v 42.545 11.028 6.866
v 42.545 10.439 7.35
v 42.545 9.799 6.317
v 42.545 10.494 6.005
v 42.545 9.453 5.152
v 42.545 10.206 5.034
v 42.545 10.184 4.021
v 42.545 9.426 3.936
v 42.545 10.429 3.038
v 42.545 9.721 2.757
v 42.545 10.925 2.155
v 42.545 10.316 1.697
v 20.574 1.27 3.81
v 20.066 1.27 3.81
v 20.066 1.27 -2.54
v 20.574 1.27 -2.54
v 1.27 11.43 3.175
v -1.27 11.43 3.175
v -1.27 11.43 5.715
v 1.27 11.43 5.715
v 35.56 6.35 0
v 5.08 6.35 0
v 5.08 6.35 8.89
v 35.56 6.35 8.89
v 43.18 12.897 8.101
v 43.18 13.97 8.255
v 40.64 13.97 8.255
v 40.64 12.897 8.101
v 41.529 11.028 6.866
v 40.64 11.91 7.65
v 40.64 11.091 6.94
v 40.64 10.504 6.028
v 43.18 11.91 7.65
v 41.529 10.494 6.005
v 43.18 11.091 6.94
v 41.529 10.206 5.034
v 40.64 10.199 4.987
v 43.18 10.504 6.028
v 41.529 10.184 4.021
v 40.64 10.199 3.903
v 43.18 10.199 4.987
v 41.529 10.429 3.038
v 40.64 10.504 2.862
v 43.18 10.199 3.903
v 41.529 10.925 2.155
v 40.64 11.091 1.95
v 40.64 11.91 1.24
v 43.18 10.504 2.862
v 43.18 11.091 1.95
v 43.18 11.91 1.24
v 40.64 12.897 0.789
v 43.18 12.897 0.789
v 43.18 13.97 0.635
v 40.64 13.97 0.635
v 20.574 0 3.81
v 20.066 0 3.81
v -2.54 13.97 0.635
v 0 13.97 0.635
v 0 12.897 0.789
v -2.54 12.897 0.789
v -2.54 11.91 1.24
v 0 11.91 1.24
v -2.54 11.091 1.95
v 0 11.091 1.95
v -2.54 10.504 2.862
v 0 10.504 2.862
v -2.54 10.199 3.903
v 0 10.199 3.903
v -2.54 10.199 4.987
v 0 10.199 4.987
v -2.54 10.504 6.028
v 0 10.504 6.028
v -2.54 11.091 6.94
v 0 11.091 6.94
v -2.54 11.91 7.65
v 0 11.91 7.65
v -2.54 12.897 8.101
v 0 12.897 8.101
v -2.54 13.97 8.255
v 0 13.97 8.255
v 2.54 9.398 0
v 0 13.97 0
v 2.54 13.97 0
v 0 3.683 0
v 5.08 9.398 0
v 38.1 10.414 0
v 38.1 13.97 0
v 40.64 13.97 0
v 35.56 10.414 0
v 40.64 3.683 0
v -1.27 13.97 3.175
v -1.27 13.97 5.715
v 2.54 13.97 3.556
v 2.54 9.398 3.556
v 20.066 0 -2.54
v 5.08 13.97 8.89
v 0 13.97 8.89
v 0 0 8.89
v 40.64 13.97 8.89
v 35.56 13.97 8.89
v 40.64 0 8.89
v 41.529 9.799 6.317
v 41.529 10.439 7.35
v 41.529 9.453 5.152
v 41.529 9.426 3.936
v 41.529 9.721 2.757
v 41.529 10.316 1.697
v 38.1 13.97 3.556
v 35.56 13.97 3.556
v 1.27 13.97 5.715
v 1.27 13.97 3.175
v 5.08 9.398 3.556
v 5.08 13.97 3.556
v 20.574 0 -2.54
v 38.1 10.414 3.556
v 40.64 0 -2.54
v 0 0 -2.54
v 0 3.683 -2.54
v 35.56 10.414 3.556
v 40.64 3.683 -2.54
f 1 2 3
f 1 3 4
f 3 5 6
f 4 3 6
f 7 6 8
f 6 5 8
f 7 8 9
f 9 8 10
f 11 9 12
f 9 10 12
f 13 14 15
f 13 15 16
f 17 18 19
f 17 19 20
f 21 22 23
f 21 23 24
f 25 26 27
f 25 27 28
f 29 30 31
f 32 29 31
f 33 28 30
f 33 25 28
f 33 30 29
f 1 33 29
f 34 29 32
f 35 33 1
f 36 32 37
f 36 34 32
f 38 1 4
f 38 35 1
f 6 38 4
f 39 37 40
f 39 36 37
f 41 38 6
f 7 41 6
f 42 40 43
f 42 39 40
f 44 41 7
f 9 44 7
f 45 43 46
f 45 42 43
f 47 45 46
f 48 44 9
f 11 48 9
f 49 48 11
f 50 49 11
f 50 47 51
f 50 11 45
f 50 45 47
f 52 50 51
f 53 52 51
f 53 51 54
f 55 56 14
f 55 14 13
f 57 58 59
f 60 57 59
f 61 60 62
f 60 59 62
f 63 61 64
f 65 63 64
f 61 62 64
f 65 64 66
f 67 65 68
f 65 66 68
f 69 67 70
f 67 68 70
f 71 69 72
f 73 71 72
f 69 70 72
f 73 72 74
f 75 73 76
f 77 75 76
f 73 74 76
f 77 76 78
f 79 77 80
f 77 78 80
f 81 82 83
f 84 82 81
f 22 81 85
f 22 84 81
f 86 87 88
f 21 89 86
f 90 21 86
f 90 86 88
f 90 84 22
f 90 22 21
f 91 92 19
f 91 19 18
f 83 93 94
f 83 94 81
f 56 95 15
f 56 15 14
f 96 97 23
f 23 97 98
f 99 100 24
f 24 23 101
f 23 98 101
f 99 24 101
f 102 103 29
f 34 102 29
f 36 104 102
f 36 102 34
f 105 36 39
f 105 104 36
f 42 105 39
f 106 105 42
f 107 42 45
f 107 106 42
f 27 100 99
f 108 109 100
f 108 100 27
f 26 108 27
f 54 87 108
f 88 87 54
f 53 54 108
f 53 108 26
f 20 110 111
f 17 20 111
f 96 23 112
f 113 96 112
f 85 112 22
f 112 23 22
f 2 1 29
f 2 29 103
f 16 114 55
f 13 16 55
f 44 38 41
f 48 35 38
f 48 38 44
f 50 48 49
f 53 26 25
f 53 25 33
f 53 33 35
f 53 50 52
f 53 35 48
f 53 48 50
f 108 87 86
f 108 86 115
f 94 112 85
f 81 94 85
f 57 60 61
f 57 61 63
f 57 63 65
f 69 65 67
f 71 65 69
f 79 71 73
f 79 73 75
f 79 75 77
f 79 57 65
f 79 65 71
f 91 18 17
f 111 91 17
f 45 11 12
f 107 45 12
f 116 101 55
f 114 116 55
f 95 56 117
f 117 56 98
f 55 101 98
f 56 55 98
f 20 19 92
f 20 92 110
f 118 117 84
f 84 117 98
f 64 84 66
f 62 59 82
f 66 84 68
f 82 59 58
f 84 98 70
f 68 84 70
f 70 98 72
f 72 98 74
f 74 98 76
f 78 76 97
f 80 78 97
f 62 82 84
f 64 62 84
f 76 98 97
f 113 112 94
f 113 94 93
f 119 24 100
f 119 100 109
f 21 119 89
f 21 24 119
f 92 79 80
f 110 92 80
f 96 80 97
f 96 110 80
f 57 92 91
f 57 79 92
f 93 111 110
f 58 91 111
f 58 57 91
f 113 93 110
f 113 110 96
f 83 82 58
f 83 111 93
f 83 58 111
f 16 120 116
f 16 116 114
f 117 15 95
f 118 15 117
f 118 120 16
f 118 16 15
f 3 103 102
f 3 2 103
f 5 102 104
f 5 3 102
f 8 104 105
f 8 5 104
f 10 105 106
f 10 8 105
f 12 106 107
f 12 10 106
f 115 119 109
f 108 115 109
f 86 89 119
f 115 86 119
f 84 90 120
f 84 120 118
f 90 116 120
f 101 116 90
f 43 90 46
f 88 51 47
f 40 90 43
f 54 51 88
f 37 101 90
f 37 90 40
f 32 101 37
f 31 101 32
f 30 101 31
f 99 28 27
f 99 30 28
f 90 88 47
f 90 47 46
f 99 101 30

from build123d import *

# Parameters (mm, degrees)
SKETCH1_W           = 40.64
SKETCH1_H           = 6.35
BOSS_EXTRUDE1_DEPTH = 8.89
SKETCH2_W           = 5.08
SKETCH2_H           = 8.89
BOSS_EXTRUDE2_DEPTH = 7.62
SKETCH3_W           = 5.08
SKETCH3_H           = 8.89
BOSS_EXTRUDE3_DEPTH = 7.62
SKETCH4_W           = 3.556
SKETCH4_H           = 4.572
CUT_EXTRUDE1_DEPTH  = 2.54
BOSS_EXTRUDE4_DEPTH = 2.54
SKETCH6_W           = 40.64
SKETCH6_H           = 3.683
BOSS_EXTRUDE5_DEPTH = 2.54
SKETCH7_W           = 3.556
SKETCH7_H           = 3.556
CUT_EXTRUDE2_DEPTH  = 2.54
BOSS_EXTRUDE6_START = 2.54
BOSS_EXTRUDE6_DEPTH = 2.54
WRAP1_SECTION_W     = 0.762
WRAP1_SECTION_H     = 1.016
WRAP1_ANGLE         = 76.394372684
SKETCH11_W          = 0.508
SKETCH11_H          = 6.35
CUT_EXTRUDE3_DEPTH  = 1.27
SKETCH12_W          = 2.54
SKETCH12_H          = 2.54
CUT_EXTRUDE4_DEPTH  = 2.54


with BuildPart() as part:
    # Sketch1 → Boss-Extrude1 (new body)
    with BuildSketch(Plane.XY):
        with Locations((20.32, 3.175)):
            Rectangle(SKETCH1_W, SKETCH1_H)
    extrude(amount=BOSS_EXTRUDE1_DEPTH)

    # Sketch2 → Boss-Extrude2 (add)
    with BuildSketch(Plane(origin=(0, 6.35, 0), x_dir=(1, 0, 0), z_dir=(0, 1, 0))):
        with Locations((2.54, -4.445)):
            Rectangle(SKETCH2_W, SKETCH2_H)
    extrude(amount=BOSS_EXTRUDE2_DEPTH)

    # Sketch3 → Boss-Extrude3 (add)
    with BuildSketch(Plane(origin=(0, 6.35, 0), x_dir=(1, 0, 0), z_dir=(0, 1, 0))):
        with Locations((38.1, -4.445)):
            Rectangle(SKETCH3_W, SKETCH3_H)
    extrude(amount=BOSS_EXTRUDE3_DEPTH)

    # Sketch4 → Cut-Extrude1 (cut)
    with BuildSketch(Plane(origin=(5.08, 0, 0), x_dir=(0, 0, -1), z_dir=(1, 0, 0))):
        with Locations((-1.778, 11.684)):
            Rectangle(SKETCH4_W, SKETCH4_H)
    extrude(amount=-CUT_EXTRUDE1_DEPTH, mode=Mode.SUBTRACT)

    # Sketch5 → Boss-Extrude4 (add)
    with BuildSketch(Plane.ZY):
        with BuildLine():
            Line((8.255, 13.97), (0.635, 13.97))
            ThreePointArc((0.635, 13.97), (4.445, 10.16), (8.255, 13.97))
        make_face()
    extrude(amount=BOSS_EXTRUDE4_DEPTH)

    # Sketch6 → Boss-Extrude5 (add)
    with BuildSketch(Plane(origin=(0, 0, 0), x_dir=(-1, 0, 0), z_dir=(0, 0, -1))):
        with Locations((-20.32, 1.8415)):
            Rectangle(SKETCH6_W, SKETCH6_H)
    extrude(amount=BOSS_EXTRUDE5_DEPTH)

    # Sketch7 → Cut-Extrude2 (cut)
    with BuildSketch(Plane.ZY.offset(-35.56)):
        with Locations((1.778, 12.192)):
            Rectangle(SKETCH7_W, SKETCH7_H)
    extrude(amount=-CUT_EXTRUDE2_DEPTH, mode=Mode.SUBTRACT)

    # Sketch8 → Boss-Extrude6 (add)
    with BuildSketch(Plane(origin=(40.64, 0, 0), x_dir=(0, 0, -1), z_dir=(1, 0, 0)).offset(BOSS_EXTRUDE6_START)):
        with BuildLine():
            Line((-0.635, 13.97), (-8.255, 13.97))
            ThreePointArc((-8.255, 13.97), (-4.445, 10.16), (-0.635, 13.97))
        make_face()
    extrude(amount=-BOSS_EXTRUDE6_DEPTH)

    # Wrap1 section (on wrap section) → Wrap1 (revolve)
    with BuildSketch(Plane(origin=(43.18, 13.97, 4.445), x_dir=(0, -0.772203868534924, 0.6353748385163658), z_dir=(0, 0.6353748385163658, 0.772203868534924))):
        with Locations((4.191, -1.143)):
            Rectangle(WRAP1_SECTION_W, WRAP1_SECTION_H)
    revolve(axis=Axis((43.18, 13.97, 4.445), (1, 0, 0)), revolution_arc=WRAP1_ANGLE)

    # Sketch11 → Cut-Extrude3 (cut)
    with BuildSketch(Plane.XZ):
        with Locations((20.32, 0.635)):
            Rectangle(SKETCH11_W, SKETCH11_H)
    extrude(amount=-CUT_EXTRUDE3_DEPTH, mode=Mode.SUBTRACT)

    # Sketch12 → Cut-Extrude4 (cut)
    with BuildSketch(Plane(origin=(0, 13.97, 0), x_dir=(1, 0, 0), z_dir=(0, 1, 0))):
        with Locations((0, -4.445)):
            Rectangle(SKETCH12_W, SKETCH12_H)
    extrude(amount=-CUT_EXTRUDE4_DEPTH, mode=Mode.SUBTRACT)


solid = part.part
